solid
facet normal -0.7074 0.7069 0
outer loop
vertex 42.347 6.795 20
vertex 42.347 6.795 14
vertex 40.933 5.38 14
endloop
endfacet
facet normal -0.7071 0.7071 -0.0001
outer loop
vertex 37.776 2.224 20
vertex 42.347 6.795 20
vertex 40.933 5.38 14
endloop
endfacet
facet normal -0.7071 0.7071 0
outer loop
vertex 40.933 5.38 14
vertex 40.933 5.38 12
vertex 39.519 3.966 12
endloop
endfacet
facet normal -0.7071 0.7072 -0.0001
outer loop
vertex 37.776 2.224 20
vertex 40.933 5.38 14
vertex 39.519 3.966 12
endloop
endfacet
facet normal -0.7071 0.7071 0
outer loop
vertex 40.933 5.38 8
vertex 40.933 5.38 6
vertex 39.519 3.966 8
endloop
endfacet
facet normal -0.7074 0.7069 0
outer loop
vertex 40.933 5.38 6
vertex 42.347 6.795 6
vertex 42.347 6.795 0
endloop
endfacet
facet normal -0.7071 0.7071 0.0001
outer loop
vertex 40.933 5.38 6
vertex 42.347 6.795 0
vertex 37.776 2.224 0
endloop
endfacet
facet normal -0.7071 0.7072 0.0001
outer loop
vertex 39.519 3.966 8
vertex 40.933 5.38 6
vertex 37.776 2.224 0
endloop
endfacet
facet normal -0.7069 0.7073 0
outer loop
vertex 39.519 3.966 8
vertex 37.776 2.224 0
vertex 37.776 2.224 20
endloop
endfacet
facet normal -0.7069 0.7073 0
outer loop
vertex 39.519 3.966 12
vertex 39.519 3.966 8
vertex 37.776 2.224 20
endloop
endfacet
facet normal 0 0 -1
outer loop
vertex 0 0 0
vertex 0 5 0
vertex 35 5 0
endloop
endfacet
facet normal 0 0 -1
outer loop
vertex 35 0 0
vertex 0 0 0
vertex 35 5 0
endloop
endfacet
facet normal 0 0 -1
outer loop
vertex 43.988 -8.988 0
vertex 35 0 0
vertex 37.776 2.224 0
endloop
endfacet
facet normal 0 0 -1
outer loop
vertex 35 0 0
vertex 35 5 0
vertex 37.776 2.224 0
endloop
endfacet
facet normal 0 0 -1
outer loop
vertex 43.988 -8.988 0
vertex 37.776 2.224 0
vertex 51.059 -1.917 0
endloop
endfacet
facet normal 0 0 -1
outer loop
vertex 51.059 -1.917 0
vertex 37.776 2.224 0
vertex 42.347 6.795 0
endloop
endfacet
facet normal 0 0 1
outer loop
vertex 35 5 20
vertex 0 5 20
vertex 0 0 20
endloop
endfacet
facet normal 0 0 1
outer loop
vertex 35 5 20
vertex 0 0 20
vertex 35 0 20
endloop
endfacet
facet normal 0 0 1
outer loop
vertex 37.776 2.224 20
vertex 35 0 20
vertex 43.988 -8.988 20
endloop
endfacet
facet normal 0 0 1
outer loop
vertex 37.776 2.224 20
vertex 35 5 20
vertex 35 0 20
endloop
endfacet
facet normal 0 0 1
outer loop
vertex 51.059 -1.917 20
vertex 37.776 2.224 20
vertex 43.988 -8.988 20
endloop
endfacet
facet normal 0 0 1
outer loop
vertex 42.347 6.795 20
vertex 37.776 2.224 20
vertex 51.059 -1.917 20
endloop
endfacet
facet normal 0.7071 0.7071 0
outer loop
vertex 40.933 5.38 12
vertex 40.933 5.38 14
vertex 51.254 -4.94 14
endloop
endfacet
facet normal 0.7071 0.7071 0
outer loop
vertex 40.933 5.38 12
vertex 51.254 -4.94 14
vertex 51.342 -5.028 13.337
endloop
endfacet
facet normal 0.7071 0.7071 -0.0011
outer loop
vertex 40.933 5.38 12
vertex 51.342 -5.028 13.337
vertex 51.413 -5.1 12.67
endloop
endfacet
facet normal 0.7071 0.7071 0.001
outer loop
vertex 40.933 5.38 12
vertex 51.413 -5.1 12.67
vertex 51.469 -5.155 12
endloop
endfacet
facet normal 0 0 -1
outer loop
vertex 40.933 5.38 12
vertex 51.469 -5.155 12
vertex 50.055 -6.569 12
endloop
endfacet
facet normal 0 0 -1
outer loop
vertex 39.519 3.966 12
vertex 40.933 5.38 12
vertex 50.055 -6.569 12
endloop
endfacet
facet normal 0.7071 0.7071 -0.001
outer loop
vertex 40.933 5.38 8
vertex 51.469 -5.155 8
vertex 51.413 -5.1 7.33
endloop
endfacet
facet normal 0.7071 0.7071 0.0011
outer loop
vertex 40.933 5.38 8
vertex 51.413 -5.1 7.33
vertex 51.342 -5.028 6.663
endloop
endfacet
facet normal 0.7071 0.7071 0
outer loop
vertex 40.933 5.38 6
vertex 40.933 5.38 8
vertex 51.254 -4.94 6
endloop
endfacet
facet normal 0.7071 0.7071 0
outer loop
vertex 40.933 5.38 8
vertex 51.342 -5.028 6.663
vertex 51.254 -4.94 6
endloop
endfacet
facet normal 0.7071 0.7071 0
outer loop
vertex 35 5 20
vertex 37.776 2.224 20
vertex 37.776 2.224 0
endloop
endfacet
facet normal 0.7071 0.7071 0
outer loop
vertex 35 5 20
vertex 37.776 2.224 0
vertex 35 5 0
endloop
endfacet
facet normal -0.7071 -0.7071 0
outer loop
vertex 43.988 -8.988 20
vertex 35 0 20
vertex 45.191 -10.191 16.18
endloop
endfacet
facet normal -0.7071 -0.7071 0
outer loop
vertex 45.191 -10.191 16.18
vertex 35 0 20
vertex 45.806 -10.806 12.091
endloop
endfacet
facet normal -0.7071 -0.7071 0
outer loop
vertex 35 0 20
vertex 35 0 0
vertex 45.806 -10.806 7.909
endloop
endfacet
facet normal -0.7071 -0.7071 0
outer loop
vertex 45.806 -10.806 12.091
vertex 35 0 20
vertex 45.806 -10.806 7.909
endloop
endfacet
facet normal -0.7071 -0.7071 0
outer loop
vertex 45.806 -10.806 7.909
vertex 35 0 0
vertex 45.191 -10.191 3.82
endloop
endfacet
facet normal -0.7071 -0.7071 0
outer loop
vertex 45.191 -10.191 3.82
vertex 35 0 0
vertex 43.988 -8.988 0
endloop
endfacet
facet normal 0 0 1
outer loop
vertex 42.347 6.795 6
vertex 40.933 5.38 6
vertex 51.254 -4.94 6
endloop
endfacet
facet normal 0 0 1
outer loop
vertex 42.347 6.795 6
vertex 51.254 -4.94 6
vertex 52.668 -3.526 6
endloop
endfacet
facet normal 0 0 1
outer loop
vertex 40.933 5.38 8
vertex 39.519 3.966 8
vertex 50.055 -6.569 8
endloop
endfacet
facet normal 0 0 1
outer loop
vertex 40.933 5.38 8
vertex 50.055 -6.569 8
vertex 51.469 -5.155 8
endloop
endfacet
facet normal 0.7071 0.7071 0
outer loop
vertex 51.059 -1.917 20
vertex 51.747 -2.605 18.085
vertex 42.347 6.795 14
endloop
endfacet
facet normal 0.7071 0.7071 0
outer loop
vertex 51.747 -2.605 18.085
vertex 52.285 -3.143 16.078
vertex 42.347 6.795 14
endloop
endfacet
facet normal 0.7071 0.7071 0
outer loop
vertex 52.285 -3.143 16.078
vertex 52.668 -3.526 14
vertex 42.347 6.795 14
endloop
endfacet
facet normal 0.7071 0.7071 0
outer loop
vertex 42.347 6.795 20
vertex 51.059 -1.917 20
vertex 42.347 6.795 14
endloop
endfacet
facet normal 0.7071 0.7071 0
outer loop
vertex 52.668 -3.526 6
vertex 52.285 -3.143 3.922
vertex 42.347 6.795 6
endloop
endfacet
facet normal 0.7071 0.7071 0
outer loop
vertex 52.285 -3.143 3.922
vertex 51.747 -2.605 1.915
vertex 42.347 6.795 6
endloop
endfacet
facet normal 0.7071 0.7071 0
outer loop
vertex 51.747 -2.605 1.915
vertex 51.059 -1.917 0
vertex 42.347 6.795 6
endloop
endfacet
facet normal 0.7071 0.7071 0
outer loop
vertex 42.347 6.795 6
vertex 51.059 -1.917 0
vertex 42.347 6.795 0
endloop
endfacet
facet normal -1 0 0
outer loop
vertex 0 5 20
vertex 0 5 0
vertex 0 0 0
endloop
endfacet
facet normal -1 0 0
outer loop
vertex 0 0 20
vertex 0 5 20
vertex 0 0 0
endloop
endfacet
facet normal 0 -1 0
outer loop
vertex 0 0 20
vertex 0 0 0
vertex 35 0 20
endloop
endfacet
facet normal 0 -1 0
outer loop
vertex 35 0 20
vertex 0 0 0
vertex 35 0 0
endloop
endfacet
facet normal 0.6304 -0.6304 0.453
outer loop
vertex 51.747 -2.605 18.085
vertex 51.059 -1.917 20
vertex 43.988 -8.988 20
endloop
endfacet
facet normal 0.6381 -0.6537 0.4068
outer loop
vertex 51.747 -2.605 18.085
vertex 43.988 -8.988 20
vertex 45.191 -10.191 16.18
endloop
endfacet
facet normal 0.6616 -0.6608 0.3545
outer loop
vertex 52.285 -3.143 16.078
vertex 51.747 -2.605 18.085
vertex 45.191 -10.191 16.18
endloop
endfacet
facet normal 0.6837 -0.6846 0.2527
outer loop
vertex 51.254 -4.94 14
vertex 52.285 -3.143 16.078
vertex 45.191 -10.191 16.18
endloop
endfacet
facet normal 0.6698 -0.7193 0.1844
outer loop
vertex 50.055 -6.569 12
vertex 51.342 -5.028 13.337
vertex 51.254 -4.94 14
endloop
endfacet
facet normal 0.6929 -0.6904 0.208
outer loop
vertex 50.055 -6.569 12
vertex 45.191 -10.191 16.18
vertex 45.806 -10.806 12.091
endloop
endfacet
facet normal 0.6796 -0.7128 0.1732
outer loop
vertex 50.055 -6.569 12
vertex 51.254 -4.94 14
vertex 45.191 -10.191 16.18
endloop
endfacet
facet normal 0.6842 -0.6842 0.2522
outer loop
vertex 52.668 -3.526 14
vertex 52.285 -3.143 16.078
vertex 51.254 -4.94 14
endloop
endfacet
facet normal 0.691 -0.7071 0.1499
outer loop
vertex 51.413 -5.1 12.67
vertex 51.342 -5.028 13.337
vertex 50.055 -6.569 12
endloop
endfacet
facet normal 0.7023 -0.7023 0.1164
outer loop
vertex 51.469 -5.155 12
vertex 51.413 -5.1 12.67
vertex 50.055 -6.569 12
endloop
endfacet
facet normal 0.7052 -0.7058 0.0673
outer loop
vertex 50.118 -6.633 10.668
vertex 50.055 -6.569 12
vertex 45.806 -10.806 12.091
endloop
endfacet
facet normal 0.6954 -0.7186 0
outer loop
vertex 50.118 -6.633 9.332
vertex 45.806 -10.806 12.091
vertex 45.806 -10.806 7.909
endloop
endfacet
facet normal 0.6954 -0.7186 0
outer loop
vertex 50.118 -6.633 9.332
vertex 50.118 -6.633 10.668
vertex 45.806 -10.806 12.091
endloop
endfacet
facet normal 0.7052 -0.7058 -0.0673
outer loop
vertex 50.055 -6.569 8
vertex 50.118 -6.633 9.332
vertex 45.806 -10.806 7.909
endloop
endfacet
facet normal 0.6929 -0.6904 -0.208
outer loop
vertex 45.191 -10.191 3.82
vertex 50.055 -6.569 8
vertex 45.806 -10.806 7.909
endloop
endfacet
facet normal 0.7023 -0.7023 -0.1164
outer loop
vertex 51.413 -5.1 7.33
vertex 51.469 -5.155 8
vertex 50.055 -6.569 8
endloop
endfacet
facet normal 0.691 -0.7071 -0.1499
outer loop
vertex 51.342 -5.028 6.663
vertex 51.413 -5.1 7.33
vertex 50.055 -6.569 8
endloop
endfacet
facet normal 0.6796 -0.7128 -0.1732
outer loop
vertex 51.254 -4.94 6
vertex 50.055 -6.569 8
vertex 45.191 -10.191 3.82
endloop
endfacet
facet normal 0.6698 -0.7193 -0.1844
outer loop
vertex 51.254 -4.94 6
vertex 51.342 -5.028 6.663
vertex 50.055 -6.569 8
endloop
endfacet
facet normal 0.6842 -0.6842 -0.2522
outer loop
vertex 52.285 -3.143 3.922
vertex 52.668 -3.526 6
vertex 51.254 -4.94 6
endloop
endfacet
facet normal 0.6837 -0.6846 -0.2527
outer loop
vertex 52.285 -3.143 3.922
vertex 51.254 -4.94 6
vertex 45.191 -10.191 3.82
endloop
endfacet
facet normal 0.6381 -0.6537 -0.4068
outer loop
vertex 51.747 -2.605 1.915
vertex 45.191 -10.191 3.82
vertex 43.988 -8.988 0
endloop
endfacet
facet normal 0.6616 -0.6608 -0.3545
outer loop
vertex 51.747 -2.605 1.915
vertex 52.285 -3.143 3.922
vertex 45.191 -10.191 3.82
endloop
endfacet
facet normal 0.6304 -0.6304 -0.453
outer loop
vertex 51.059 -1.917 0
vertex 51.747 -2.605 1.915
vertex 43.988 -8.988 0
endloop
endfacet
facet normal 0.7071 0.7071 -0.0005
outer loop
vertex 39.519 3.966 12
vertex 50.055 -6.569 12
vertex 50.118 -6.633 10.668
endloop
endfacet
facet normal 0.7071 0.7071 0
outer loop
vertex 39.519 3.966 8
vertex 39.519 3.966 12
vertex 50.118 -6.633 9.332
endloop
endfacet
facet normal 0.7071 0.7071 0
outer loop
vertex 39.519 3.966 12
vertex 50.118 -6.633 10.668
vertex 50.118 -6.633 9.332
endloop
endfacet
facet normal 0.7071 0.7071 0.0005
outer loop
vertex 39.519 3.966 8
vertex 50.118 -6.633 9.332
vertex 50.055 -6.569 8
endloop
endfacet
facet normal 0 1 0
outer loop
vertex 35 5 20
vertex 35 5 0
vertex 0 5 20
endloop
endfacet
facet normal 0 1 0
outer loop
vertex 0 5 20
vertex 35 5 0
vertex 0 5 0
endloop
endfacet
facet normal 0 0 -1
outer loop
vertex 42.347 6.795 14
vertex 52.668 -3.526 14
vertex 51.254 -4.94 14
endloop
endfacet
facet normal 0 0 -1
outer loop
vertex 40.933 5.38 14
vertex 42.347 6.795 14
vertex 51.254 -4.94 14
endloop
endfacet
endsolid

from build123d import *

# Parameters (mm, degrees)
BOSS_EXTRUDE1_DEPTH      = 20
CUT_EXTRUDE5_DEPTH       = 6
CUT_EXTRUDE5_DEPTH_BACK  = 45.944197614
CUT_EXTRUDE10_DEPTH      = 8.5
CUT_EXTRUDE10_DEPTH_BACK = 43.444197614


with BuildPart() as part:
    # Sketch2 → Boss-Extrude1 (new body)
    with BuildSketch(Plane.XY):
        Polygon((0, 0), (35, 0), (45.883024287, -10.883024287), (52.954092099, -3.811956475), (42.347490381, 6.794645243), (37.776422569, 2.223577431), (35, 5), (0, 5), align=None)
    extrude(amount=BOSS_EXTRUDE1_DEPTH)

    # Sketch3 → Cut-Extrude5 (cut, two sides)
    with BuildSketch(Plane(origin=(28.383024287, -28.383024287, 0), x_dir=(0, 0, -1), z_dir=(0.707106781, -0.707106781, 0))) as cut_extrude5_sk:
        Polygon((-14, 134.13575902), (-14, 34.748737342), (-14, 32.748737342), (-12, 32.748737342), (-12, 30.748737342), (-8, 30.748737342), (-8, 32.748737342), (-6, 32.748737342), (-6, 34.748737342), (-6, 134.13575902), (-6, 332.909802377), (-14, 332.909802377), align=None)
    extrude(amount=CUT_EXTRUDE5_DEPTH, mode=Mode.SUBTRACT)
    extrude(cut_extrude5_sk.sketch, amount=-CUT_EXTRUDE5_DEPTH_BACK, mode=Mode.SUBTRACT)

    # Sketch4 → Cut-Extrude10 (cut, two sides)
    with BuildSketch(Plane(origin=(24.571067812, 24.571067812, 0), x_dir=(0, 0, -1), z_dir=(0.707106781, 0.707106781, 0))) as cut_extrude10_sk:
        with BuildLine():
            Line((-109.647389073, 14.29777825), (-20, -37.460165963))
            ThreePointArc((-20, -37.460165963), (-10, -40.139657887), (0, -37.460165963))
            Line((0, -37.460165963), (89.647389073, 14.29777825))
            Line((89.647389073, 14.29777825), (89.647389073, -192.733998604))
            Line((89.647389073, -192.733998604), (-109.647389073, -192.733998604))
            Line((-109.647389073, -192.733998604), (-109.647389073, 14.29777825))
        make_face()
    extrude(amount=CUT_EXTRUDE10_DEPTH, mode=Mode.SUBTRACT)
    extrude(cut_extrude10_sk.sketch, amount=-CUT_EXTRUDE10_DEPTH_BACK, mode=Mode.SUBTRACT)


solid = part.part
